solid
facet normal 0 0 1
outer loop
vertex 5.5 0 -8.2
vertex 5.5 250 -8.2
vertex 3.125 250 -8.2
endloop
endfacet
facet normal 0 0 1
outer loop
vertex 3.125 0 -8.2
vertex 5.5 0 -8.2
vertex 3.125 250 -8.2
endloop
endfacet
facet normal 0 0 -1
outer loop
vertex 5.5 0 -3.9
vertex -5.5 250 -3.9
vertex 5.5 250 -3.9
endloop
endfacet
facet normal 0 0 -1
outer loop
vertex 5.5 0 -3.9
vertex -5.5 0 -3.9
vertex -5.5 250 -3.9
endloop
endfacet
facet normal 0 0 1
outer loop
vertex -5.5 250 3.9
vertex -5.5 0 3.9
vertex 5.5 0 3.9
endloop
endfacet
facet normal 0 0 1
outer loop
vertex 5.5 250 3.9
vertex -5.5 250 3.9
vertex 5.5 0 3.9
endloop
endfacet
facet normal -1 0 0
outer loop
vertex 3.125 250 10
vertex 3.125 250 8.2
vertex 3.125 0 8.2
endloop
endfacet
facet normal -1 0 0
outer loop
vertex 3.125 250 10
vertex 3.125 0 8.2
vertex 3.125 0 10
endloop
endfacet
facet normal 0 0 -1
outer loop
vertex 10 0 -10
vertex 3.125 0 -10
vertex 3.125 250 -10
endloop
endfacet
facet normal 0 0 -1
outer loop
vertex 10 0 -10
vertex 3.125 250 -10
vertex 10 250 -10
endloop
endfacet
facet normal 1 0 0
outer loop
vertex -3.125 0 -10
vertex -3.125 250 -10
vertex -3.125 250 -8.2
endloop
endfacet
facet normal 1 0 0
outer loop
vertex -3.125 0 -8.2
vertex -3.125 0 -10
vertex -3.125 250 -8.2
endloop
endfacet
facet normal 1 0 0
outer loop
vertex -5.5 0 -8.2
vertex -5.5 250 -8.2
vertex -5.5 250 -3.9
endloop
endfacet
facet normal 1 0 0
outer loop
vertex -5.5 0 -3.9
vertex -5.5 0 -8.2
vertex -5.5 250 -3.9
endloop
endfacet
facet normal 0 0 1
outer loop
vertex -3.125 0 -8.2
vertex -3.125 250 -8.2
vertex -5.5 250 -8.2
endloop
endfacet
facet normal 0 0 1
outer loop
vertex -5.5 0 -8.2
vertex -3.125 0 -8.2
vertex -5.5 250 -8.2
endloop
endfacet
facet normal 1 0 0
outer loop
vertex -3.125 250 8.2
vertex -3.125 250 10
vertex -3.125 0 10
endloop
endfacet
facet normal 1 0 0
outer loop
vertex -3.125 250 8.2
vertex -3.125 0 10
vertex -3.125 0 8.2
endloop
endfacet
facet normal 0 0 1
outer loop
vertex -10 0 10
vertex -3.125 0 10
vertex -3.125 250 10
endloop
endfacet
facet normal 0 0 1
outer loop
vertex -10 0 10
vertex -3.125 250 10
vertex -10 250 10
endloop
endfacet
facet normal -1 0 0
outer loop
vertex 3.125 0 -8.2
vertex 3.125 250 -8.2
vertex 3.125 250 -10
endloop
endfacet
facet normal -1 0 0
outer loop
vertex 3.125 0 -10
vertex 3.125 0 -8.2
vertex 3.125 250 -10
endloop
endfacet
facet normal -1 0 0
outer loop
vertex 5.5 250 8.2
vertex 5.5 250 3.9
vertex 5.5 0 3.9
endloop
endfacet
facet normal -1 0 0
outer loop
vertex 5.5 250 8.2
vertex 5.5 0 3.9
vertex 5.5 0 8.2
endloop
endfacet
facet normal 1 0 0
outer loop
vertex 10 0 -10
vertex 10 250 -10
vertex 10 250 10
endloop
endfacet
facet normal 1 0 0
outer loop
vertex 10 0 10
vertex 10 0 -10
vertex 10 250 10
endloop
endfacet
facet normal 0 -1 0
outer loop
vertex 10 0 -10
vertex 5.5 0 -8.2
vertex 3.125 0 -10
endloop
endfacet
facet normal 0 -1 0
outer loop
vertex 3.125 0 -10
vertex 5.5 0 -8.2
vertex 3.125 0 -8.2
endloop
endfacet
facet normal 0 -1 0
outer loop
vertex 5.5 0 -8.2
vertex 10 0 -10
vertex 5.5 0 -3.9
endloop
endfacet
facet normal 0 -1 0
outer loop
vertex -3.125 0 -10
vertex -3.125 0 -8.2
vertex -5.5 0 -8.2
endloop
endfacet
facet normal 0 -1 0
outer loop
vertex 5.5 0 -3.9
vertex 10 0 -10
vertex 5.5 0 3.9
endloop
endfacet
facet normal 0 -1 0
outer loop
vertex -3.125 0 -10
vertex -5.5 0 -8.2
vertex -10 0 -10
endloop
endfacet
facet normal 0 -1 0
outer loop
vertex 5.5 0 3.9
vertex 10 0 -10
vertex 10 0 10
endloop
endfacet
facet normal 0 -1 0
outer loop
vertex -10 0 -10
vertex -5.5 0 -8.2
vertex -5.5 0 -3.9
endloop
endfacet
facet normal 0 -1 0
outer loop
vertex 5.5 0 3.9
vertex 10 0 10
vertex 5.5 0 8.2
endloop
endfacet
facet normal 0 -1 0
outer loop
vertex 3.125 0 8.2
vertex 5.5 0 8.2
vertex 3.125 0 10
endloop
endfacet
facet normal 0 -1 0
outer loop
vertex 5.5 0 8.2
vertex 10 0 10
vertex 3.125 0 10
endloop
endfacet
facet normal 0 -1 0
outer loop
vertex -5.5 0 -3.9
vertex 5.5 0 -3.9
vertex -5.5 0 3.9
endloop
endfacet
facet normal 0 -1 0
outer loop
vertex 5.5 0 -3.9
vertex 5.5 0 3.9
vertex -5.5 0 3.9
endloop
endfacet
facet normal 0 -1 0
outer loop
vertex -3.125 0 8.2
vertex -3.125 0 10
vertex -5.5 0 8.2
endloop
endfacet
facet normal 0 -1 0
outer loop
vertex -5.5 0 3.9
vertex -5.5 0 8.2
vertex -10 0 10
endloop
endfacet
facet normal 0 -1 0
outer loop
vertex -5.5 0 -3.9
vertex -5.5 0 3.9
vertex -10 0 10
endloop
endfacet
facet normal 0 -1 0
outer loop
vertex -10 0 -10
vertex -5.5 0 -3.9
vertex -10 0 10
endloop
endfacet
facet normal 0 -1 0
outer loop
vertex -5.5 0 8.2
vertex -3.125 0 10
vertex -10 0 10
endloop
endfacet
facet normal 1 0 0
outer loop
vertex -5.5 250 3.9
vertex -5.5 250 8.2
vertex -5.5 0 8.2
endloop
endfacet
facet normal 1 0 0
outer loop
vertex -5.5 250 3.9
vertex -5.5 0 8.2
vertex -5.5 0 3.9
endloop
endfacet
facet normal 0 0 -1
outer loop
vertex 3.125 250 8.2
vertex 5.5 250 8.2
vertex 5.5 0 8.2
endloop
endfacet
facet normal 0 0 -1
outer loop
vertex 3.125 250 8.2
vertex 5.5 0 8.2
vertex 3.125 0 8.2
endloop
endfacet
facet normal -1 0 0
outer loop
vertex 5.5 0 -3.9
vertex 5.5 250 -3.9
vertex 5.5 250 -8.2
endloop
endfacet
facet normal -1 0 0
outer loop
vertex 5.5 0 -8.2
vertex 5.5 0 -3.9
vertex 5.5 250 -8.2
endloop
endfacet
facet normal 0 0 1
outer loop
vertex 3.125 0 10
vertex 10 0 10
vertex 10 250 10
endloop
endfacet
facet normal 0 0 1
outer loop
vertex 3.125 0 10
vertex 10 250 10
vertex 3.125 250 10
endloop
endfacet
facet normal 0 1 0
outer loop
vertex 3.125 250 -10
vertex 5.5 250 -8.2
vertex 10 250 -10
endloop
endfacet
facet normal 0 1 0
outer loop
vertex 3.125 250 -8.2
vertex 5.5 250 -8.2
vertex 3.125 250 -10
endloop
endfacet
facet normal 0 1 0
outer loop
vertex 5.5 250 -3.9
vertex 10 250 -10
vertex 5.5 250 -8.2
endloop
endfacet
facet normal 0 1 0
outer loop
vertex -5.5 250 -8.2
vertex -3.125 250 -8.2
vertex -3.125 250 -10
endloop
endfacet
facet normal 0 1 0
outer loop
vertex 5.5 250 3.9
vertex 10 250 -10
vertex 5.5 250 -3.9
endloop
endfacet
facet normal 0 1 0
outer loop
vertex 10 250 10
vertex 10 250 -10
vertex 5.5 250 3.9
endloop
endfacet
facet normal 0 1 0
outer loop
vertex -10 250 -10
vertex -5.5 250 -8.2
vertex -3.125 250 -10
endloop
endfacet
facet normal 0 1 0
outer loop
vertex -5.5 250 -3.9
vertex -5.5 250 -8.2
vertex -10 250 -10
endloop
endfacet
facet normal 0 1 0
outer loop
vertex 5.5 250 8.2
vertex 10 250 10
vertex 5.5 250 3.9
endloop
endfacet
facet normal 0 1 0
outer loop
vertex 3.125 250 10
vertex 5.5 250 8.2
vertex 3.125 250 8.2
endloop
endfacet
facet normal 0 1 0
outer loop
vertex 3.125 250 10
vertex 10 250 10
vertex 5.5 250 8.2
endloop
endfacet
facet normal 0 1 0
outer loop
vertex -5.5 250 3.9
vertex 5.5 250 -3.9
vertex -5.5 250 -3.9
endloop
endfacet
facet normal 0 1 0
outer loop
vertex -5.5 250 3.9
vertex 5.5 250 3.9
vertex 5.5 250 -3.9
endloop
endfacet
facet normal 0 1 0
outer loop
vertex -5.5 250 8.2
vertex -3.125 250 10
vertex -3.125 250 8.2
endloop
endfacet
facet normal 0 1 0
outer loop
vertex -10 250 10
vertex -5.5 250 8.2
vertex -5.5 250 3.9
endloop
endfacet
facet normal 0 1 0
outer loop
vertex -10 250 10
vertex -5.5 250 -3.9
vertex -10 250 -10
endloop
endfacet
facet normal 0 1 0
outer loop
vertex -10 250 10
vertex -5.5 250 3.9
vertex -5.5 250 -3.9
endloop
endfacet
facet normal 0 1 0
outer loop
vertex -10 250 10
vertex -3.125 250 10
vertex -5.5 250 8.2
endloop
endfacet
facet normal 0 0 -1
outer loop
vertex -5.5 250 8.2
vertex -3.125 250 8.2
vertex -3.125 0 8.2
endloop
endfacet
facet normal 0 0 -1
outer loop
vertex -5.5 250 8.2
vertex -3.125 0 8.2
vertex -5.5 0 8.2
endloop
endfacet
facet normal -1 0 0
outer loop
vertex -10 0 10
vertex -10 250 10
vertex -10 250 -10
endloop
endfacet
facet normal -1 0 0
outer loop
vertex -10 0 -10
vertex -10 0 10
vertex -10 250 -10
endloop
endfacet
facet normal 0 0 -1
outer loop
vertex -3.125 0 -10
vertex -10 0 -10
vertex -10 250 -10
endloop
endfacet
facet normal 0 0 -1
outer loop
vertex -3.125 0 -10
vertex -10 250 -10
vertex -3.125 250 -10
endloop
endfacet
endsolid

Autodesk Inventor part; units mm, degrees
ref_plane "YZ Plane" through (0, 0, 0) normal (1, 0, 0) x (0, 1, 0)
ref_plane "XZ Plane" through (0, 0, 0) normal (0, 1, 0) x (-1, 0, 0)
ref_plane "XY Plane" through (0, 0, 0) normal (0, 0, 1) x (1, 0, 0)
sketch "Sketch1" plane through (0, 0, 0) normal (0, 1, 0) x (-1, 0, 0)
  line L0 (10, 10) -> (10, -10)
  line L1 (-10, -10) -> (-10, 10)
  line L2 (3.125, -10) -> (3.125, -8.2)
  line L3 (3.125, -8.2) -> (5.5, -8.2)
  line L4 (5.5, -8.2) -> (5.5, -3.9)
  line L5 (5.5, -3.9) -> (-5.5, -3.9)
  line L6 (-5.5, -3.9) -> (-5.5, -8.2)
  line L7 (-5.5, -8.2) -> (-3.125, -8.2)
  line L8 (-3.125, -8.2) -> (-3.125, -10)
  line L9 (10, -10) -> (3.125, -10)
  line L10 (-3.125, -10) -> (-10, -10)
  line L11 (3.125, 10) -> (3.125, 8.2)
  line L12 (3.125, 8.2) -> (5.5, 8.2)
  line L13 (5.5, 8.2) -> (5.5, 3.9)
  line L14 (5.5, 3.9) -> (-5.5, 3.9)
  line L15 (-5.5, 3.9) -> (-5.5, 8.2)
  line L16 (-5.5, 8.2) -> (-3.125, 8.2)
  line L17 (-3.125, 8.2) -> (-3.125, 10)
  line L18 (-10, 10) -> (-3.125, 10)
  line L19 (3.125, 10) -> (10, 10)
  point P0 (0, 0)
  dimension "d0" = 20
  dimension "d1" = 20
  dimension "d4" = 2.375
  dimension "d5" = 4.3
  dimension "d6" = 11
  dimension "d7" = 2.375
  dimension "d8" = 1.8
  dimension "d9" = 6.875
  dimension "d10" = 1.8
  dimension "d11" = 4.3
extrude "Extrusion1" add sketch "Sketch1" along normal blind 250
properties part number "Perfil"
